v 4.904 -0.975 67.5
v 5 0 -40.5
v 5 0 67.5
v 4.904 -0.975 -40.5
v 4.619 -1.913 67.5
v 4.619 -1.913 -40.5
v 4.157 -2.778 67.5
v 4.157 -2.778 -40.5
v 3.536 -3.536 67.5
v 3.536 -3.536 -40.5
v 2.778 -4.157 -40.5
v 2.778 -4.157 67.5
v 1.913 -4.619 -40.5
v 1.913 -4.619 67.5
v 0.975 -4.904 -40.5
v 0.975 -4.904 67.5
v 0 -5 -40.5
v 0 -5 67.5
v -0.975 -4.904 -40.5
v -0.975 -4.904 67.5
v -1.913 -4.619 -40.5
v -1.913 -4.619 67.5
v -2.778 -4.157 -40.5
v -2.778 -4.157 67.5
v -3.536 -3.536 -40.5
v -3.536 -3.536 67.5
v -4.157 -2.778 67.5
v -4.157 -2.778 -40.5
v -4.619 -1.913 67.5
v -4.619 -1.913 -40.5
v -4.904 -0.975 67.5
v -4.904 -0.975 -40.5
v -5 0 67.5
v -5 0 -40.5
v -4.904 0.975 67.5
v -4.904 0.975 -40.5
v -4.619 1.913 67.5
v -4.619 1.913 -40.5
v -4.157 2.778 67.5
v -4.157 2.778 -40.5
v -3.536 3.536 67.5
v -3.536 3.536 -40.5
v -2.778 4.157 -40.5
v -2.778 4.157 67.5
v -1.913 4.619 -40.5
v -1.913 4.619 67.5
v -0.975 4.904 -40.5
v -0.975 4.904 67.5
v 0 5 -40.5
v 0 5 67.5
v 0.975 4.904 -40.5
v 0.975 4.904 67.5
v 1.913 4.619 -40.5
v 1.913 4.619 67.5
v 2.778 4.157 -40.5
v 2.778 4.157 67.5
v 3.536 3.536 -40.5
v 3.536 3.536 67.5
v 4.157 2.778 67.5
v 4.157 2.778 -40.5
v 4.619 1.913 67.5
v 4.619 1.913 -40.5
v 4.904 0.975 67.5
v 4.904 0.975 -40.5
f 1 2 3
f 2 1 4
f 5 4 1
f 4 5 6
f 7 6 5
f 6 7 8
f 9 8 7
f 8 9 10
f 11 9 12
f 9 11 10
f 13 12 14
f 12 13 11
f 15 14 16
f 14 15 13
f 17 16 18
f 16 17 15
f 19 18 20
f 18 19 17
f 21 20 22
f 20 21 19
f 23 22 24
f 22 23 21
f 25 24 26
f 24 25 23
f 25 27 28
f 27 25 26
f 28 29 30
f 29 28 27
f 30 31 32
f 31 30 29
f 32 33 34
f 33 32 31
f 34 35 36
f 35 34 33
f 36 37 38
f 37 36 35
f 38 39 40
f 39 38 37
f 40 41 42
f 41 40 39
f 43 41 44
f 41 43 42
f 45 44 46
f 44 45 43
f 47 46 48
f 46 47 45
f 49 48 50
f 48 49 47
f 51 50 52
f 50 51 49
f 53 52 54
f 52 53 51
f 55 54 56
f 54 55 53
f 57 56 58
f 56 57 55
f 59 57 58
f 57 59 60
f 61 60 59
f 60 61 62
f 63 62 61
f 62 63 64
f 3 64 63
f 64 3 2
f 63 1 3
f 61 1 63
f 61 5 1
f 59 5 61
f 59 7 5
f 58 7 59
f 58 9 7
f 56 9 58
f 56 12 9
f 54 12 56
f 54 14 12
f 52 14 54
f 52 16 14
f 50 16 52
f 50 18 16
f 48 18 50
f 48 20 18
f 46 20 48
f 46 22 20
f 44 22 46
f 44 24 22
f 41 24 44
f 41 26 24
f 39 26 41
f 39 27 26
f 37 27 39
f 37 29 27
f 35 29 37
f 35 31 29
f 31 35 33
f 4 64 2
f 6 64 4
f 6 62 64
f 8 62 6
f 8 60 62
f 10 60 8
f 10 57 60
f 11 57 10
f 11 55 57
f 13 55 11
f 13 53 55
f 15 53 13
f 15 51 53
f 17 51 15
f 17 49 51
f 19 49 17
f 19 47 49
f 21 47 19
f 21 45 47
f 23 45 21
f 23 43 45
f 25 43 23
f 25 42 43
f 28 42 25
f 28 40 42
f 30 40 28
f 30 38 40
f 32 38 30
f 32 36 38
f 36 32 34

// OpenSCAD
// ============================================================
// INNER SHAFT — Solid 10mm rod
// ============================================================

include <../params.scad>

module inner_shaft() {
    rotate([0, 0, ANG_SS])
    color(C_SHAFT)
    translate([0, 0, INNER_SHAFT_ZBOT])
    cylinder(d=INNER_SHAFT_D, h=INNER_SHAFT_ZTOP - INNER_SHAFT_ZBOT, $fn=32);
}

// ============================================================
// STANDALONE PREVIEW
// ============================================================
rotate([180, 0, 0]) inner_shaft();
